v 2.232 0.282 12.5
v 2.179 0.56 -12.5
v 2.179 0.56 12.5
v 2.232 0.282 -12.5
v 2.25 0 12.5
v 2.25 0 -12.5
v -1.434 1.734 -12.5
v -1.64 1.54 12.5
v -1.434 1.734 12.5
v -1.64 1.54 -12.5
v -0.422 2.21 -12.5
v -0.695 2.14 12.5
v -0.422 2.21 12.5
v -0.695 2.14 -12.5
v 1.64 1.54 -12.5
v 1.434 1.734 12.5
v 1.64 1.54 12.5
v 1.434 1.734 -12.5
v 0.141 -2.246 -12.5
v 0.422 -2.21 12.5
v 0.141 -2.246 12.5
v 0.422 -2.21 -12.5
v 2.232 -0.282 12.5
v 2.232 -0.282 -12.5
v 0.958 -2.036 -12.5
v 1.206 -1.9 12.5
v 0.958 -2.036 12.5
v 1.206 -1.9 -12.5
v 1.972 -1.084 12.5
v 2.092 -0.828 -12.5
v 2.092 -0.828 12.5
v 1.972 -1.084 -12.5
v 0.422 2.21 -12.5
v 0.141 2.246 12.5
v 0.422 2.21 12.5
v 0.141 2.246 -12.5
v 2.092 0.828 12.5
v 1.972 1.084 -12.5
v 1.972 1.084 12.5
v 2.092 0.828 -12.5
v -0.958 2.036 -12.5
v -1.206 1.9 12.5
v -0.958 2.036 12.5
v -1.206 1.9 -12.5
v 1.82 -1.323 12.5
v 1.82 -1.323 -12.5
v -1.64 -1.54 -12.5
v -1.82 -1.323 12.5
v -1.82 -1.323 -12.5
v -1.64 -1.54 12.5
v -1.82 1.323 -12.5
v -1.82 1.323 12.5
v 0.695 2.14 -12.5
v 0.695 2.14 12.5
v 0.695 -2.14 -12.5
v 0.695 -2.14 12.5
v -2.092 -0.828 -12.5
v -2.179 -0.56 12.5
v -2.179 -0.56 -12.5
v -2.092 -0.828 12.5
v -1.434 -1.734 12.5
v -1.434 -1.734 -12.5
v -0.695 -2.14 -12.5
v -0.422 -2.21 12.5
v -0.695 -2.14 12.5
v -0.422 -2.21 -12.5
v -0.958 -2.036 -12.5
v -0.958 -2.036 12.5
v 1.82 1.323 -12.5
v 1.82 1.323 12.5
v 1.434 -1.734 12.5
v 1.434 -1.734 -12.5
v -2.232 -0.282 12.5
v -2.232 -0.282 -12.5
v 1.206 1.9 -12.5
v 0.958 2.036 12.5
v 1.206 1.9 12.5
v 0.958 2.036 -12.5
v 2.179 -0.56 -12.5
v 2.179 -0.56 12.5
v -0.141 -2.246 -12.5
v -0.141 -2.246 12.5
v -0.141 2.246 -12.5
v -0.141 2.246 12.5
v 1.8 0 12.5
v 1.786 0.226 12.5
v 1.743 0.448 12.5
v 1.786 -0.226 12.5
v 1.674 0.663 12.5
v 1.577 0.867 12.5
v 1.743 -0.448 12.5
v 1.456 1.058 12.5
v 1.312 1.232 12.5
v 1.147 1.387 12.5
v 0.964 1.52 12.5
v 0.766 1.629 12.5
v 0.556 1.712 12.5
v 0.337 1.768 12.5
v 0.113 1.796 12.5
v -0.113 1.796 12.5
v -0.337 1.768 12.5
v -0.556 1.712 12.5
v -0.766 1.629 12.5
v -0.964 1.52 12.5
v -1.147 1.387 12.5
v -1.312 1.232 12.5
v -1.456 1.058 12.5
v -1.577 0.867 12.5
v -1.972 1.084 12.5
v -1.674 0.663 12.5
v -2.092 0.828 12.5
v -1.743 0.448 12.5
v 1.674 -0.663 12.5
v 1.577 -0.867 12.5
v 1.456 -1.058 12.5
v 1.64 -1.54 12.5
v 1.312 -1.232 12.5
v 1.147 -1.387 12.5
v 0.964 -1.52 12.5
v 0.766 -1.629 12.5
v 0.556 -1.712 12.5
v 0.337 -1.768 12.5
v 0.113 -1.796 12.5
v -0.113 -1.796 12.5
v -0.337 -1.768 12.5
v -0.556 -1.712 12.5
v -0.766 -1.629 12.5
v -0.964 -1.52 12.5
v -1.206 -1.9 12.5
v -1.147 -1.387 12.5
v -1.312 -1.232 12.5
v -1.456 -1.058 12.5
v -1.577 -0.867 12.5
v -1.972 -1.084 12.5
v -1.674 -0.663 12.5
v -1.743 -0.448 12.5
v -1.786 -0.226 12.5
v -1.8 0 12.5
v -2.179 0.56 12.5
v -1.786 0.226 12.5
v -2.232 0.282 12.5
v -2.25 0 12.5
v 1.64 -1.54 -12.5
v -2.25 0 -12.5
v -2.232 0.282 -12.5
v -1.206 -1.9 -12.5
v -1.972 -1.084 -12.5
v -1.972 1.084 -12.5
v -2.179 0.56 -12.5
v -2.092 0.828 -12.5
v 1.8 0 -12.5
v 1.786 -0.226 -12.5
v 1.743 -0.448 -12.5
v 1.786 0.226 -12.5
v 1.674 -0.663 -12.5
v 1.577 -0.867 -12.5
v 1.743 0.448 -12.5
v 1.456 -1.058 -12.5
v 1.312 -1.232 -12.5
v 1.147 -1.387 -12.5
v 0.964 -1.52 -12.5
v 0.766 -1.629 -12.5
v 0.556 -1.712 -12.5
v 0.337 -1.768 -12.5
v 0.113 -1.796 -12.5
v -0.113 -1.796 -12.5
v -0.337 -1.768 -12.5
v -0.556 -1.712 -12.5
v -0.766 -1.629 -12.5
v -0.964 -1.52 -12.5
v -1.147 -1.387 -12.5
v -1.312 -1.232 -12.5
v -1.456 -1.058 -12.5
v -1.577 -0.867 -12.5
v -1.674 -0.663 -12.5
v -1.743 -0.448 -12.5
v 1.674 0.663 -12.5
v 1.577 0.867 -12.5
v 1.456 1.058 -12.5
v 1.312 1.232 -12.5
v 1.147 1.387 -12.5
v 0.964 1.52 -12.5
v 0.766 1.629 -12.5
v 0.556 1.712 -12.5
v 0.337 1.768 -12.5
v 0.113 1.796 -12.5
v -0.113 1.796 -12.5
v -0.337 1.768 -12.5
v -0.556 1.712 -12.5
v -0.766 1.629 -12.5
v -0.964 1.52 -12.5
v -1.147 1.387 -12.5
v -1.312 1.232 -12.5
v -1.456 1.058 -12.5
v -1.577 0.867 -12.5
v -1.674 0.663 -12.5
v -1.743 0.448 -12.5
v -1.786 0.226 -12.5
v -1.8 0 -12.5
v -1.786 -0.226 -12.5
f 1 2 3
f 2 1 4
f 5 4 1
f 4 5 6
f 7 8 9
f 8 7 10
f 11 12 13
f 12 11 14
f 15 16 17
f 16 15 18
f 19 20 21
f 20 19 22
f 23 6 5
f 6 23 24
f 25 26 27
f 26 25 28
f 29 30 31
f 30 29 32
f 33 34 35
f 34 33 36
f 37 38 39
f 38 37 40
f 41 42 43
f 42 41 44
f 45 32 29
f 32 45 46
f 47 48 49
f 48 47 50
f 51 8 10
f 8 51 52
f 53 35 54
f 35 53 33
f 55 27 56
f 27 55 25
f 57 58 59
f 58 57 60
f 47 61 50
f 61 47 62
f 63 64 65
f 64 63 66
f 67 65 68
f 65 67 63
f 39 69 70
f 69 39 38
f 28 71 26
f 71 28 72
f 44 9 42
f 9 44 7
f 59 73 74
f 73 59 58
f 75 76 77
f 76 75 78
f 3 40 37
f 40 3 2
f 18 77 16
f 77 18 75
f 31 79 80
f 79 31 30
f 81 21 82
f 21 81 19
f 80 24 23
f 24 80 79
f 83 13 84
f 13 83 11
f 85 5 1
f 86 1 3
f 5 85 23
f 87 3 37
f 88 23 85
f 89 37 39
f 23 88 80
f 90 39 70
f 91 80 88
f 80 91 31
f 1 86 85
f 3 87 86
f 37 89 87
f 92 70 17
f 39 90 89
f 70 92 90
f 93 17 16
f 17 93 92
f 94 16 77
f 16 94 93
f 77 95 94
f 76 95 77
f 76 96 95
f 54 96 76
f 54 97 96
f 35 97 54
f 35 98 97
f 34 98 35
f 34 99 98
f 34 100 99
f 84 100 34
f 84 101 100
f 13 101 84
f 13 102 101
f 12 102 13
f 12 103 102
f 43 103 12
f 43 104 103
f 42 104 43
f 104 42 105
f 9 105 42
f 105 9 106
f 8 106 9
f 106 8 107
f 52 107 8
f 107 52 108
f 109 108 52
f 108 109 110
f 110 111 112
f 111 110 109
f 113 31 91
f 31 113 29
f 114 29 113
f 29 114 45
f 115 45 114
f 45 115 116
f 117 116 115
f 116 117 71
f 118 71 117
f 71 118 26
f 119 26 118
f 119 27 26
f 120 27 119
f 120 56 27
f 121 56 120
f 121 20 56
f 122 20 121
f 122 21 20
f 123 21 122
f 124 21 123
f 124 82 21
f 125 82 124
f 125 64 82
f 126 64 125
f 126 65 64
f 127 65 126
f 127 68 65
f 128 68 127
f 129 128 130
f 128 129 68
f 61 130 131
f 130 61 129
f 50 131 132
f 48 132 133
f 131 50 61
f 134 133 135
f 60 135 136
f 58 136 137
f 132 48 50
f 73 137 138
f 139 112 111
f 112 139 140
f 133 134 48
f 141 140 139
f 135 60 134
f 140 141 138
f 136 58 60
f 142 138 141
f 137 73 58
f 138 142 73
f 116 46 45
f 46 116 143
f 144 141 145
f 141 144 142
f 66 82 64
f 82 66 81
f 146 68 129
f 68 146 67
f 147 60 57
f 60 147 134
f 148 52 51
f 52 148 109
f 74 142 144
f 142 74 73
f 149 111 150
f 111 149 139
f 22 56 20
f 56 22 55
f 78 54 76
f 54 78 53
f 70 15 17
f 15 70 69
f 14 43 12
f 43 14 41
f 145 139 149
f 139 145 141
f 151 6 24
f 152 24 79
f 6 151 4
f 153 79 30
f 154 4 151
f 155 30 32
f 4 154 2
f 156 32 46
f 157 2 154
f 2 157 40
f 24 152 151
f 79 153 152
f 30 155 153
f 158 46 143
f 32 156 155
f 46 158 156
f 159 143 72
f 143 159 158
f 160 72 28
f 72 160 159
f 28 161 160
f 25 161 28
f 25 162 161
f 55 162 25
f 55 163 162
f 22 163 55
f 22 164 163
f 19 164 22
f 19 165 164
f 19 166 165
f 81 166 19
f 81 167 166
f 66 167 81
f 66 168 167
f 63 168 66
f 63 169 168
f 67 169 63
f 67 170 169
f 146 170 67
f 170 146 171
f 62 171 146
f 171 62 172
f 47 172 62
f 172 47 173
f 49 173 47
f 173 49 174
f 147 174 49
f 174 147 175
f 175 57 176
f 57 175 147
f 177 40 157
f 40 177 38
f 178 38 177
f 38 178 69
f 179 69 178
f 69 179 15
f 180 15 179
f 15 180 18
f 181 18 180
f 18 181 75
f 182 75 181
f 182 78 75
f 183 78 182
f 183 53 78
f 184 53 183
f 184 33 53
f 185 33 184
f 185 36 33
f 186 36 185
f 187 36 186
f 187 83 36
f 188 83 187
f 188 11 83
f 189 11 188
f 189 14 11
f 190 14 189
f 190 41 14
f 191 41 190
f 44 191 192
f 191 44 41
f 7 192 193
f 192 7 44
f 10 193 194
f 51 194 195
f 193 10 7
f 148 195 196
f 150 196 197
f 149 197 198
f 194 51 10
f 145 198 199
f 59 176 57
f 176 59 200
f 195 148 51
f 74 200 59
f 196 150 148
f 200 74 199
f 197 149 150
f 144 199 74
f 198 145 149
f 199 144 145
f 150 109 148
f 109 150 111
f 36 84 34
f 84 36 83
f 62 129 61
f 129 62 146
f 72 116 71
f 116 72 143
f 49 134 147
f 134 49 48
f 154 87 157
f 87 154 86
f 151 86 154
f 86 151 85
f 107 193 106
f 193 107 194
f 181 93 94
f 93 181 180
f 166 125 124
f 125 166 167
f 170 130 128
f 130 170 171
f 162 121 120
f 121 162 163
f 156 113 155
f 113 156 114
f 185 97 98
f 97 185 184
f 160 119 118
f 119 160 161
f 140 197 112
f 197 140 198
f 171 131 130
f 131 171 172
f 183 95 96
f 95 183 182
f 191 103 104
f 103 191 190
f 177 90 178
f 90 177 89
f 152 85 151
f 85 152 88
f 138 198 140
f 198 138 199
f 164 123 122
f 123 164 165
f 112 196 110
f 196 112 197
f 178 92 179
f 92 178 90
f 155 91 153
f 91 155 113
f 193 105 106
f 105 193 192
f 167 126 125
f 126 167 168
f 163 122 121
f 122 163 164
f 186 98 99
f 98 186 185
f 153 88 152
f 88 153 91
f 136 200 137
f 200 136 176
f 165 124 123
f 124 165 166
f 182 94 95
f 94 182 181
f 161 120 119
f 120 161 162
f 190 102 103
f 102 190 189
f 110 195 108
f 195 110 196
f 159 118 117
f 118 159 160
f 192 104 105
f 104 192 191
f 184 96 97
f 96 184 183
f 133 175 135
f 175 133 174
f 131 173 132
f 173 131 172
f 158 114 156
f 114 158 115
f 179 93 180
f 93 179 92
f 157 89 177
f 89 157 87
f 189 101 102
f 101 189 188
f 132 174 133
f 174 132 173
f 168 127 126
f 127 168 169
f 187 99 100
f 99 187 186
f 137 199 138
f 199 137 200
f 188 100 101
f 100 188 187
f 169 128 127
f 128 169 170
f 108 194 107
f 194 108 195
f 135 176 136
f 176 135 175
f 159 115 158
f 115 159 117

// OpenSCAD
$fn = 50;


difference() {
	union() {
		translate(v = [0, 0, -12.5000000000]) {
			cylinder(h = 25, r = 2.2500000000);
		}
	}
	union() {
		#translate(v = [0, 0, -100.0000000000]) {
			cylinder(h = 200, r = 1.8000000000);
		}
	}
}
